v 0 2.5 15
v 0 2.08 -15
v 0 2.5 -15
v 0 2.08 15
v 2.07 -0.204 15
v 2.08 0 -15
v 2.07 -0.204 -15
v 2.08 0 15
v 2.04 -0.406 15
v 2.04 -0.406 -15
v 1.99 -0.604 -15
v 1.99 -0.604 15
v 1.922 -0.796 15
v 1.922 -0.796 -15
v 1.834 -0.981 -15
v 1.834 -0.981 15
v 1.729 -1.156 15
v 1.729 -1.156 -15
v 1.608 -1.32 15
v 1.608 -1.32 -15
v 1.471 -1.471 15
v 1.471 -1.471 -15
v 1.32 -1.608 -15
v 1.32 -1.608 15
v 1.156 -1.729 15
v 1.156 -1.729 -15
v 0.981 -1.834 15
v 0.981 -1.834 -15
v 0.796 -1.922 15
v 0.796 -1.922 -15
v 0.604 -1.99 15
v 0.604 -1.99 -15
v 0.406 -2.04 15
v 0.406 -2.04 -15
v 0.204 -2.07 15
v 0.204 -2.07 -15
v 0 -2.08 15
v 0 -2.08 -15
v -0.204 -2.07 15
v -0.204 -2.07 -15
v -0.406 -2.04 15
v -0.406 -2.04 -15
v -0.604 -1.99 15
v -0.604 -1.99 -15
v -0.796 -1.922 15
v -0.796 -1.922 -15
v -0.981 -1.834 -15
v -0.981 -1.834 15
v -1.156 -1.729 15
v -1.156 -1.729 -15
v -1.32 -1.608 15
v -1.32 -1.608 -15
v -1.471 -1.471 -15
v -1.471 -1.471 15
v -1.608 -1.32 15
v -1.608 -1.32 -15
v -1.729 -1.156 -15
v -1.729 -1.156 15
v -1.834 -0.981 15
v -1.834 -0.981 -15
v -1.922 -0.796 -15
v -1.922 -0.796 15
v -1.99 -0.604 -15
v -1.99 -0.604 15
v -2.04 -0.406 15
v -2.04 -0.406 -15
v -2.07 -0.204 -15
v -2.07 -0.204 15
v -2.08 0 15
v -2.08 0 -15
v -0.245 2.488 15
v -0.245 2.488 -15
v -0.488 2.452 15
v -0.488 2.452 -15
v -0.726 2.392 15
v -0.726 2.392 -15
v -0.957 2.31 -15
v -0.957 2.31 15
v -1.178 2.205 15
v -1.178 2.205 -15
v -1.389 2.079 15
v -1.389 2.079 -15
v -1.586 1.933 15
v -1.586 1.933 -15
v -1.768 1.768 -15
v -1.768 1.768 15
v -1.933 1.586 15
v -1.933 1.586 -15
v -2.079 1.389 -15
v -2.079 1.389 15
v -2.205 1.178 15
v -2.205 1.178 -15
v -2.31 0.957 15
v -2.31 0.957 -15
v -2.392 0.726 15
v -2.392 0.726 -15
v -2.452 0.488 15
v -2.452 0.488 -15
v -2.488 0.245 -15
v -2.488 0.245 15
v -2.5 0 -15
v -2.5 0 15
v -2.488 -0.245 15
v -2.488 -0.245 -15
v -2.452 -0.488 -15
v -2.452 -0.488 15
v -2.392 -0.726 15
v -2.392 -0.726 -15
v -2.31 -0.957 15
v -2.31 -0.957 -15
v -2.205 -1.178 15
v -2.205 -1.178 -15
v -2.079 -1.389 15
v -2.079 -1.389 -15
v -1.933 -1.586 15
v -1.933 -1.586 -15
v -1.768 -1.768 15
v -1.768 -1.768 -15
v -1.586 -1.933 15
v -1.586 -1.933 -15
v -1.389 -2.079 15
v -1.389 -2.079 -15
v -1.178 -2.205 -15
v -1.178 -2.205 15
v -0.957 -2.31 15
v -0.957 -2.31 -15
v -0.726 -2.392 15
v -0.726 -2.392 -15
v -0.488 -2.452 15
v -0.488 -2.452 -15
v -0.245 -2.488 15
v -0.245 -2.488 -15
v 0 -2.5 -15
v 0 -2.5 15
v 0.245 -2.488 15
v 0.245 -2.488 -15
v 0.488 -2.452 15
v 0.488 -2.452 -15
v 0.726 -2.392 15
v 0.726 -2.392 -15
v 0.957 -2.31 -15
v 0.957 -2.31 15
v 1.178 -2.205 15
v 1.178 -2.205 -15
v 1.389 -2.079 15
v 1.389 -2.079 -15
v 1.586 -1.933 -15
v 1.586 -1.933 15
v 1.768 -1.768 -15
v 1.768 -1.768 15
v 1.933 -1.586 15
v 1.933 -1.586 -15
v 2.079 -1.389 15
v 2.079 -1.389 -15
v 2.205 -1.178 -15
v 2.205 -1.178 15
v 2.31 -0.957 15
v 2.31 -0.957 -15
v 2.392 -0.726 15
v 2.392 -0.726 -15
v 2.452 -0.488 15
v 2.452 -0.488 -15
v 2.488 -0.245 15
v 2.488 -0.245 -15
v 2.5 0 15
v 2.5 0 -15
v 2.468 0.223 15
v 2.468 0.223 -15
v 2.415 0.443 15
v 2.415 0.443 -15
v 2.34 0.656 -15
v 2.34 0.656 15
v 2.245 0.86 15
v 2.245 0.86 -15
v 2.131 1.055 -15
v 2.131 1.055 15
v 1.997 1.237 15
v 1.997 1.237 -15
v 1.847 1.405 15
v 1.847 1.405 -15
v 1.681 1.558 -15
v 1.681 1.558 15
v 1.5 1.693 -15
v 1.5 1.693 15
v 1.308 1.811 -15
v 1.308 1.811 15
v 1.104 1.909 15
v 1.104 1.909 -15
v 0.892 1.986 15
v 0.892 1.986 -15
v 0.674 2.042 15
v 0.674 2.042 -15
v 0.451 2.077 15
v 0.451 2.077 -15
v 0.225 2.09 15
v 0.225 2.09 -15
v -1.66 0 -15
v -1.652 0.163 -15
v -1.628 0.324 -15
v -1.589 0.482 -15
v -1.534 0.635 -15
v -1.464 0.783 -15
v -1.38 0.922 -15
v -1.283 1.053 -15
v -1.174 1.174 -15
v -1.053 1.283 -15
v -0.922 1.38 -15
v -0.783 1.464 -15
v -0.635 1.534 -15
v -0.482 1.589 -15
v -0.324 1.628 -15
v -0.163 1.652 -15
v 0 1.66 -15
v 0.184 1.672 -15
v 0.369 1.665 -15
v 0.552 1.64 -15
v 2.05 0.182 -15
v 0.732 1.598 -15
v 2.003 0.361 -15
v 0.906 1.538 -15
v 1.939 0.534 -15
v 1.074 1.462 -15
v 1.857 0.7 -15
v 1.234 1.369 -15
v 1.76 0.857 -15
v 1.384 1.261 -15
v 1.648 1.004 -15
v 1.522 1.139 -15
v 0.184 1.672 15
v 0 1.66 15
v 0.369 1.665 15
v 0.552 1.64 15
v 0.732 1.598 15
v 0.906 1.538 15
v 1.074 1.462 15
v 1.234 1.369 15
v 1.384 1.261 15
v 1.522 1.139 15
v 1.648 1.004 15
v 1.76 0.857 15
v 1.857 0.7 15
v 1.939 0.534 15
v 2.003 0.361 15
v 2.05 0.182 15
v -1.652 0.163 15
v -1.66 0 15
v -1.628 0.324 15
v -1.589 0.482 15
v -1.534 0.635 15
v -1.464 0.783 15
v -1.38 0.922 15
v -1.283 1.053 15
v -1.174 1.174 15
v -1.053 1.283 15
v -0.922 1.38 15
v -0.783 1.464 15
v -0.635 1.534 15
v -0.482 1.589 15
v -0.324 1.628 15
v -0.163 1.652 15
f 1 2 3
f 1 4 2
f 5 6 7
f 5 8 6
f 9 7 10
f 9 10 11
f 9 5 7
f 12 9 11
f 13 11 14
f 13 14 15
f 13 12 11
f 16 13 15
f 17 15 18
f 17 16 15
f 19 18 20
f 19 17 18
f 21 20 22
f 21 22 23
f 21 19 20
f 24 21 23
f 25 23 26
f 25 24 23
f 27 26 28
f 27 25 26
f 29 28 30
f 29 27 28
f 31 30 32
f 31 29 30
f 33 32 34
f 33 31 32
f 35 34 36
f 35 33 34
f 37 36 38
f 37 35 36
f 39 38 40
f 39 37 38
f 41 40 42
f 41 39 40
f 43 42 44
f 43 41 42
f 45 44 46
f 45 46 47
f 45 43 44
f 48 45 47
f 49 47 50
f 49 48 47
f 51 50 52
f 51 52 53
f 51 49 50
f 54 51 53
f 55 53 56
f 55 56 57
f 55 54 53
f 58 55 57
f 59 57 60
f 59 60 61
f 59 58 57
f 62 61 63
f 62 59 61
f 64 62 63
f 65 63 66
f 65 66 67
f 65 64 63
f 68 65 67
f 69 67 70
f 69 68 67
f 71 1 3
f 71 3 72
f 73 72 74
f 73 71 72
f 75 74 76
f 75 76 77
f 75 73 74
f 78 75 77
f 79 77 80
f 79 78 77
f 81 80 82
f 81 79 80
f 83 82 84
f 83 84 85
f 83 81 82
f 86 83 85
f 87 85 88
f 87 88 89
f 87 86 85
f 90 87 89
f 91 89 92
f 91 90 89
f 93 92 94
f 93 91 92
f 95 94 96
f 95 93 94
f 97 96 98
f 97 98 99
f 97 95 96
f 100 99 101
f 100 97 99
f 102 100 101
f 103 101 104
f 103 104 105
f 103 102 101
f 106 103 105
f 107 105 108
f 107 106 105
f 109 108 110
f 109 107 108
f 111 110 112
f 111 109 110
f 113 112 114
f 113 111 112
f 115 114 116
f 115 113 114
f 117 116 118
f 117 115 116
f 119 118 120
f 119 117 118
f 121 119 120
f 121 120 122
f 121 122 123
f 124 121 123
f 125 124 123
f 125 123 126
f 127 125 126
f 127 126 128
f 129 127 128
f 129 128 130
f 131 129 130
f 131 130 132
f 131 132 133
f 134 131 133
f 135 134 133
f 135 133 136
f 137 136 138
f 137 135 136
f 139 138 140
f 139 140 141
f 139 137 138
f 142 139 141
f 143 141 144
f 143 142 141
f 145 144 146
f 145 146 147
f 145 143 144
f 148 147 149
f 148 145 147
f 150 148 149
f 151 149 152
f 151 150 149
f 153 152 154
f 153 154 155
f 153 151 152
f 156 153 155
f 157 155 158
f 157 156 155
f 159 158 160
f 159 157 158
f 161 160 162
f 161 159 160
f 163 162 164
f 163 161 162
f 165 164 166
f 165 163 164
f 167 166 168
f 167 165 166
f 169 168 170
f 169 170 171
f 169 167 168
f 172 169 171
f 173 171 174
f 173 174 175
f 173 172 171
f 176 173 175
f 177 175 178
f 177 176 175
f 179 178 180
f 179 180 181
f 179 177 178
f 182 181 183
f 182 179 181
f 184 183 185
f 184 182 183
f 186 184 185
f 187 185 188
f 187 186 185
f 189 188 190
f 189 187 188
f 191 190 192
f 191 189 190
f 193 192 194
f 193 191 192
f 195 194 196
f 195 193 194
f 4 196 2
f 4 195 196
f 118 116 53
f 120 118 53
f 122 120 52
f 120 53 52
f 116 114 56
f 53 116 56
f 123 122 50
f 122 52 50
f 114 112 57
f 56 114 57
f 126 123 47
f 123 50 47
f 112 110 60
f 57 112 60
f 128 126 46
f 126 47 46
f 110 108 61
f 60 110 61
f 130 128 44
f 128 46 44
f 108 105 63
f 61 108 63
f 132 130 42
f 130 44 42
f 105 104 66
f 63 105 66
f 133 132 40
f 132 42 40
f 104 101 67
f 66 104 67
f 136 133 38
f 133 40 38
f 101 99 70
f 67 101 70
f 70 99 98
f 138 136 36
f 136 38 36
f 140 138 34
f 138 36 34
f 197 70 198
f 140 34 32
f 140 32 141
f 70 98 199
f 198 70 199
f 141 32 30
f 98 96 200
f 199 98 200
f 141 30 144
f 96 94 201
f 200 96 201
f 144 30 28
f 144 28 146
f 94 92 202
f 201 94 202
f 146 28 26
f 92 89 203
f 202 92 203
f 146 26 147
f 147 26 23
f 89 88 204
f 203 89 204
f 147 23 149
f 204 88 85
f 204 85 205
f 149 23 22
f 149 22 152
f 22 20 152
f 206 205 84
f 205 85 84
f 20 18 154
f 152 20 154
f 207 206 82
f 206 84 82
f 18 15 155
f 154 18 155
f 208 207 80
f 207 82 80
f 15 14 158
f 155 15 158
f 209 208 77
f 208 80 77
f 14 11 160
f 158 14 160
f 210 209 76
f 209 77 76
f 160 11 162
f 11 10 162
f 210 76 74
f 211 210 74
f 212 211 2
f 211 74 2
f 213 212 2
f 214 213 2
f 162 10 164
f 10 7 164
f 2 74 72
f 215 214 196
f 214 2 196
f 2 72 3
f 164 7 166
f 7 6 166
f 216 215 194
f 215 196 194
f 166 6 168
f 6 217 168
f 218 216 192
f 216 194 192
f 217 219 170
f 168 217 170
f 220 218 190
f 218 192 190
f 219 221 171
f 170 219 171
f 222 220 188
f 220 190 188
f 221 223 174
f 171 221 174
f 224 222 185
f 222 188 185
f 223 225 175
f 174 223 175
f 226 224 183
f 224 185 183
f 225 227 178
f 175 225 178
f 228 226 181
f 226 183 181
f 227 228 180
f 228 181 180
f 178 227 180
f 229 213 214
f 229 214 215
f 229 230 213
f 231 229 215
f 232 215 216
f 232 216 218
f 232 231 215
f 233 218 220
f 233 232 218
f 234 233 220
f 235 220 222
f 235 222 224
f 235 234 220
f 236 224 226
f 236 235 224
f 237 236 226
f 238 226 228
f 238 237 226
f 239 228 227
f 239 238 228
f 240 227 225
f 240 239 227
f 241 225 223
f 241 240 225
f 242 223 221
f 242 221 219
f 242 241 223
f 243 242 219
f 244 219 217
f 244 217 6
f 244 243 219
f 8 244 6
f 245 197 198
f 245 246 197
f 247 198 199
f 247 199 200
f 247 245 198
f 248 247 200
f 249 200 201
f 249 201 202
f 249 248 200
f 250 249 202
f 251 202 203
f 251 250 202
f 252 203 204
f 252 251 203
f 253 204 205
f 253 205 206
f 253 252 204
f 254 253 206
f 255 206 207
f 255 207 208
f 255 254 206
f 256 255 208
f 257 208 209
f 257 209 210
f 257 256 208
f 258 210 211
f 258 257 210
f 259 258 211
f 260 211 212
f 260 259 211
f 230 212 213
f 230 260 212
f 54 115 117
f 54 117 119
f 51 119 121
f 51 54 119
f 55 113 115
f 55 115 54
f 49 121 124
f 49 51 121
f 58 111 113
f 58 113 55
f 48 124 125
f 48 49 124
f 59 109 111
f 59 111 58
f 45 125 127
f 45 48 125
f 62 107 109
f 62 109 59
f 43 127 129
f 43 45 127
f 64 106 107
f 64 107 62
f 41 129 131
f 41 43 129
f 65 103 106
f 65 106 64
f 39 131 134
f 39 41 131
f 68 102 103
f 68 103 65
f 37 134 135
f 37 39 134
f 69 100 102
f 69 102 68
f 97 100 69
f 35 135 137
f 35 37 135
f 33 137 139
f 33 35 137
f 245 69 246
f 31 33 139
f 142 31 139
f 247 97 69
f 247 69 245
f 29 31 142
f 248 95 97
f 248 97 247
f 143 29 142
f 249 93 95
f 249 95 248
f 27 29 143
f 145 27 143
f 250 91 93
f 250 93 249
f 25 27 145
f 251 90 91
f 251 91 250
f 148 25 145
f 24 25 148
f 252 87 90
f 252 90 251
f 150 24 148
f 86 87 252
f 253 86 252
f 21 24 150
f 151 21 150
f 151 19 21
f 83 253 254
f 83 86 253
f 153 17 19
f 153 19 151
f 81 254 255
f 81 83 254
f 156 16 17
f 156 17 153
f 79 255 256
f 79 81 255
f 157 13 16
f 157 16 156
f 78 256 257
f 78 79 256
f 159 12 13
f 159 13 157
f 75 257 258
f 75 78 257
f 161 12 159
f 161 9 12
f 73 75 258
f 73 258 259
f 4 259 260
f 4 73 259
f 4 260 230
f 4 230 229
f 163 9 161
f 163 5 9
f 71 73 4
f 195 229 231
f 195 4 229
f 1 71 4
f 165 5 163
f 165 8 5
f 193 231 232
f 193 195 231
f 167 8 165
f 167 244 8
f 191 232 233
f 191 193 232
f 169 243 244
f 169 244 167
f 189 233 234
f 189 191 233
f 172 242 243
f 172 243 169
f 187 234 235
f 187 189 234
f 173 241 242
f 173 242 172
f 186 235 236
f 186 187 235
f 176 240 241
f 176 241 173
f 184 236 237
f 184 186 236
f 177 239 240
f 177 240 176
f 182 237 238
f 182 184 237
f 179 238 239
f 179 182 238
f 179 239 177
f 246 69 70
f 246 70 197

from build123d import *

# Parameters (mm, degrees)
BASE_EXTRUDE_DEPTH = 15


with BuildPart() as part:
    # Sketch1 → Base-Extrude (new, symmetric)
    with BuildSketch(Plane.XY):
        with BuildLine():
            Line((0, 2.08), (0, 2.5))
            ThreePointArc((0, 2.5), (-1.767766953, -1.767766953), (2.5, 0))
            ThreePointArc((2.5, 0), (1.680782105, 1.557766953), (0, 2.08))
        make_face()
        with BuildLine():
            Line((-2.08, 0), (-1.66, 0))
            ThreePointArc((-1.66, 0), (-1.173797257, 1.173797257), (0, 1.66))
            ThreePointArc((0, 1.66), (1.383797257, 1.260782105), (2.08, 0))
            ThreePointArc((2.08, 0), (0, -2.08), (-2.08, 0))
        make_face(mode=Mode.SUBTRACT)
    extrude(amount=BASE_EXTRUDE_DEPTH, both=True)


solid = part.part
